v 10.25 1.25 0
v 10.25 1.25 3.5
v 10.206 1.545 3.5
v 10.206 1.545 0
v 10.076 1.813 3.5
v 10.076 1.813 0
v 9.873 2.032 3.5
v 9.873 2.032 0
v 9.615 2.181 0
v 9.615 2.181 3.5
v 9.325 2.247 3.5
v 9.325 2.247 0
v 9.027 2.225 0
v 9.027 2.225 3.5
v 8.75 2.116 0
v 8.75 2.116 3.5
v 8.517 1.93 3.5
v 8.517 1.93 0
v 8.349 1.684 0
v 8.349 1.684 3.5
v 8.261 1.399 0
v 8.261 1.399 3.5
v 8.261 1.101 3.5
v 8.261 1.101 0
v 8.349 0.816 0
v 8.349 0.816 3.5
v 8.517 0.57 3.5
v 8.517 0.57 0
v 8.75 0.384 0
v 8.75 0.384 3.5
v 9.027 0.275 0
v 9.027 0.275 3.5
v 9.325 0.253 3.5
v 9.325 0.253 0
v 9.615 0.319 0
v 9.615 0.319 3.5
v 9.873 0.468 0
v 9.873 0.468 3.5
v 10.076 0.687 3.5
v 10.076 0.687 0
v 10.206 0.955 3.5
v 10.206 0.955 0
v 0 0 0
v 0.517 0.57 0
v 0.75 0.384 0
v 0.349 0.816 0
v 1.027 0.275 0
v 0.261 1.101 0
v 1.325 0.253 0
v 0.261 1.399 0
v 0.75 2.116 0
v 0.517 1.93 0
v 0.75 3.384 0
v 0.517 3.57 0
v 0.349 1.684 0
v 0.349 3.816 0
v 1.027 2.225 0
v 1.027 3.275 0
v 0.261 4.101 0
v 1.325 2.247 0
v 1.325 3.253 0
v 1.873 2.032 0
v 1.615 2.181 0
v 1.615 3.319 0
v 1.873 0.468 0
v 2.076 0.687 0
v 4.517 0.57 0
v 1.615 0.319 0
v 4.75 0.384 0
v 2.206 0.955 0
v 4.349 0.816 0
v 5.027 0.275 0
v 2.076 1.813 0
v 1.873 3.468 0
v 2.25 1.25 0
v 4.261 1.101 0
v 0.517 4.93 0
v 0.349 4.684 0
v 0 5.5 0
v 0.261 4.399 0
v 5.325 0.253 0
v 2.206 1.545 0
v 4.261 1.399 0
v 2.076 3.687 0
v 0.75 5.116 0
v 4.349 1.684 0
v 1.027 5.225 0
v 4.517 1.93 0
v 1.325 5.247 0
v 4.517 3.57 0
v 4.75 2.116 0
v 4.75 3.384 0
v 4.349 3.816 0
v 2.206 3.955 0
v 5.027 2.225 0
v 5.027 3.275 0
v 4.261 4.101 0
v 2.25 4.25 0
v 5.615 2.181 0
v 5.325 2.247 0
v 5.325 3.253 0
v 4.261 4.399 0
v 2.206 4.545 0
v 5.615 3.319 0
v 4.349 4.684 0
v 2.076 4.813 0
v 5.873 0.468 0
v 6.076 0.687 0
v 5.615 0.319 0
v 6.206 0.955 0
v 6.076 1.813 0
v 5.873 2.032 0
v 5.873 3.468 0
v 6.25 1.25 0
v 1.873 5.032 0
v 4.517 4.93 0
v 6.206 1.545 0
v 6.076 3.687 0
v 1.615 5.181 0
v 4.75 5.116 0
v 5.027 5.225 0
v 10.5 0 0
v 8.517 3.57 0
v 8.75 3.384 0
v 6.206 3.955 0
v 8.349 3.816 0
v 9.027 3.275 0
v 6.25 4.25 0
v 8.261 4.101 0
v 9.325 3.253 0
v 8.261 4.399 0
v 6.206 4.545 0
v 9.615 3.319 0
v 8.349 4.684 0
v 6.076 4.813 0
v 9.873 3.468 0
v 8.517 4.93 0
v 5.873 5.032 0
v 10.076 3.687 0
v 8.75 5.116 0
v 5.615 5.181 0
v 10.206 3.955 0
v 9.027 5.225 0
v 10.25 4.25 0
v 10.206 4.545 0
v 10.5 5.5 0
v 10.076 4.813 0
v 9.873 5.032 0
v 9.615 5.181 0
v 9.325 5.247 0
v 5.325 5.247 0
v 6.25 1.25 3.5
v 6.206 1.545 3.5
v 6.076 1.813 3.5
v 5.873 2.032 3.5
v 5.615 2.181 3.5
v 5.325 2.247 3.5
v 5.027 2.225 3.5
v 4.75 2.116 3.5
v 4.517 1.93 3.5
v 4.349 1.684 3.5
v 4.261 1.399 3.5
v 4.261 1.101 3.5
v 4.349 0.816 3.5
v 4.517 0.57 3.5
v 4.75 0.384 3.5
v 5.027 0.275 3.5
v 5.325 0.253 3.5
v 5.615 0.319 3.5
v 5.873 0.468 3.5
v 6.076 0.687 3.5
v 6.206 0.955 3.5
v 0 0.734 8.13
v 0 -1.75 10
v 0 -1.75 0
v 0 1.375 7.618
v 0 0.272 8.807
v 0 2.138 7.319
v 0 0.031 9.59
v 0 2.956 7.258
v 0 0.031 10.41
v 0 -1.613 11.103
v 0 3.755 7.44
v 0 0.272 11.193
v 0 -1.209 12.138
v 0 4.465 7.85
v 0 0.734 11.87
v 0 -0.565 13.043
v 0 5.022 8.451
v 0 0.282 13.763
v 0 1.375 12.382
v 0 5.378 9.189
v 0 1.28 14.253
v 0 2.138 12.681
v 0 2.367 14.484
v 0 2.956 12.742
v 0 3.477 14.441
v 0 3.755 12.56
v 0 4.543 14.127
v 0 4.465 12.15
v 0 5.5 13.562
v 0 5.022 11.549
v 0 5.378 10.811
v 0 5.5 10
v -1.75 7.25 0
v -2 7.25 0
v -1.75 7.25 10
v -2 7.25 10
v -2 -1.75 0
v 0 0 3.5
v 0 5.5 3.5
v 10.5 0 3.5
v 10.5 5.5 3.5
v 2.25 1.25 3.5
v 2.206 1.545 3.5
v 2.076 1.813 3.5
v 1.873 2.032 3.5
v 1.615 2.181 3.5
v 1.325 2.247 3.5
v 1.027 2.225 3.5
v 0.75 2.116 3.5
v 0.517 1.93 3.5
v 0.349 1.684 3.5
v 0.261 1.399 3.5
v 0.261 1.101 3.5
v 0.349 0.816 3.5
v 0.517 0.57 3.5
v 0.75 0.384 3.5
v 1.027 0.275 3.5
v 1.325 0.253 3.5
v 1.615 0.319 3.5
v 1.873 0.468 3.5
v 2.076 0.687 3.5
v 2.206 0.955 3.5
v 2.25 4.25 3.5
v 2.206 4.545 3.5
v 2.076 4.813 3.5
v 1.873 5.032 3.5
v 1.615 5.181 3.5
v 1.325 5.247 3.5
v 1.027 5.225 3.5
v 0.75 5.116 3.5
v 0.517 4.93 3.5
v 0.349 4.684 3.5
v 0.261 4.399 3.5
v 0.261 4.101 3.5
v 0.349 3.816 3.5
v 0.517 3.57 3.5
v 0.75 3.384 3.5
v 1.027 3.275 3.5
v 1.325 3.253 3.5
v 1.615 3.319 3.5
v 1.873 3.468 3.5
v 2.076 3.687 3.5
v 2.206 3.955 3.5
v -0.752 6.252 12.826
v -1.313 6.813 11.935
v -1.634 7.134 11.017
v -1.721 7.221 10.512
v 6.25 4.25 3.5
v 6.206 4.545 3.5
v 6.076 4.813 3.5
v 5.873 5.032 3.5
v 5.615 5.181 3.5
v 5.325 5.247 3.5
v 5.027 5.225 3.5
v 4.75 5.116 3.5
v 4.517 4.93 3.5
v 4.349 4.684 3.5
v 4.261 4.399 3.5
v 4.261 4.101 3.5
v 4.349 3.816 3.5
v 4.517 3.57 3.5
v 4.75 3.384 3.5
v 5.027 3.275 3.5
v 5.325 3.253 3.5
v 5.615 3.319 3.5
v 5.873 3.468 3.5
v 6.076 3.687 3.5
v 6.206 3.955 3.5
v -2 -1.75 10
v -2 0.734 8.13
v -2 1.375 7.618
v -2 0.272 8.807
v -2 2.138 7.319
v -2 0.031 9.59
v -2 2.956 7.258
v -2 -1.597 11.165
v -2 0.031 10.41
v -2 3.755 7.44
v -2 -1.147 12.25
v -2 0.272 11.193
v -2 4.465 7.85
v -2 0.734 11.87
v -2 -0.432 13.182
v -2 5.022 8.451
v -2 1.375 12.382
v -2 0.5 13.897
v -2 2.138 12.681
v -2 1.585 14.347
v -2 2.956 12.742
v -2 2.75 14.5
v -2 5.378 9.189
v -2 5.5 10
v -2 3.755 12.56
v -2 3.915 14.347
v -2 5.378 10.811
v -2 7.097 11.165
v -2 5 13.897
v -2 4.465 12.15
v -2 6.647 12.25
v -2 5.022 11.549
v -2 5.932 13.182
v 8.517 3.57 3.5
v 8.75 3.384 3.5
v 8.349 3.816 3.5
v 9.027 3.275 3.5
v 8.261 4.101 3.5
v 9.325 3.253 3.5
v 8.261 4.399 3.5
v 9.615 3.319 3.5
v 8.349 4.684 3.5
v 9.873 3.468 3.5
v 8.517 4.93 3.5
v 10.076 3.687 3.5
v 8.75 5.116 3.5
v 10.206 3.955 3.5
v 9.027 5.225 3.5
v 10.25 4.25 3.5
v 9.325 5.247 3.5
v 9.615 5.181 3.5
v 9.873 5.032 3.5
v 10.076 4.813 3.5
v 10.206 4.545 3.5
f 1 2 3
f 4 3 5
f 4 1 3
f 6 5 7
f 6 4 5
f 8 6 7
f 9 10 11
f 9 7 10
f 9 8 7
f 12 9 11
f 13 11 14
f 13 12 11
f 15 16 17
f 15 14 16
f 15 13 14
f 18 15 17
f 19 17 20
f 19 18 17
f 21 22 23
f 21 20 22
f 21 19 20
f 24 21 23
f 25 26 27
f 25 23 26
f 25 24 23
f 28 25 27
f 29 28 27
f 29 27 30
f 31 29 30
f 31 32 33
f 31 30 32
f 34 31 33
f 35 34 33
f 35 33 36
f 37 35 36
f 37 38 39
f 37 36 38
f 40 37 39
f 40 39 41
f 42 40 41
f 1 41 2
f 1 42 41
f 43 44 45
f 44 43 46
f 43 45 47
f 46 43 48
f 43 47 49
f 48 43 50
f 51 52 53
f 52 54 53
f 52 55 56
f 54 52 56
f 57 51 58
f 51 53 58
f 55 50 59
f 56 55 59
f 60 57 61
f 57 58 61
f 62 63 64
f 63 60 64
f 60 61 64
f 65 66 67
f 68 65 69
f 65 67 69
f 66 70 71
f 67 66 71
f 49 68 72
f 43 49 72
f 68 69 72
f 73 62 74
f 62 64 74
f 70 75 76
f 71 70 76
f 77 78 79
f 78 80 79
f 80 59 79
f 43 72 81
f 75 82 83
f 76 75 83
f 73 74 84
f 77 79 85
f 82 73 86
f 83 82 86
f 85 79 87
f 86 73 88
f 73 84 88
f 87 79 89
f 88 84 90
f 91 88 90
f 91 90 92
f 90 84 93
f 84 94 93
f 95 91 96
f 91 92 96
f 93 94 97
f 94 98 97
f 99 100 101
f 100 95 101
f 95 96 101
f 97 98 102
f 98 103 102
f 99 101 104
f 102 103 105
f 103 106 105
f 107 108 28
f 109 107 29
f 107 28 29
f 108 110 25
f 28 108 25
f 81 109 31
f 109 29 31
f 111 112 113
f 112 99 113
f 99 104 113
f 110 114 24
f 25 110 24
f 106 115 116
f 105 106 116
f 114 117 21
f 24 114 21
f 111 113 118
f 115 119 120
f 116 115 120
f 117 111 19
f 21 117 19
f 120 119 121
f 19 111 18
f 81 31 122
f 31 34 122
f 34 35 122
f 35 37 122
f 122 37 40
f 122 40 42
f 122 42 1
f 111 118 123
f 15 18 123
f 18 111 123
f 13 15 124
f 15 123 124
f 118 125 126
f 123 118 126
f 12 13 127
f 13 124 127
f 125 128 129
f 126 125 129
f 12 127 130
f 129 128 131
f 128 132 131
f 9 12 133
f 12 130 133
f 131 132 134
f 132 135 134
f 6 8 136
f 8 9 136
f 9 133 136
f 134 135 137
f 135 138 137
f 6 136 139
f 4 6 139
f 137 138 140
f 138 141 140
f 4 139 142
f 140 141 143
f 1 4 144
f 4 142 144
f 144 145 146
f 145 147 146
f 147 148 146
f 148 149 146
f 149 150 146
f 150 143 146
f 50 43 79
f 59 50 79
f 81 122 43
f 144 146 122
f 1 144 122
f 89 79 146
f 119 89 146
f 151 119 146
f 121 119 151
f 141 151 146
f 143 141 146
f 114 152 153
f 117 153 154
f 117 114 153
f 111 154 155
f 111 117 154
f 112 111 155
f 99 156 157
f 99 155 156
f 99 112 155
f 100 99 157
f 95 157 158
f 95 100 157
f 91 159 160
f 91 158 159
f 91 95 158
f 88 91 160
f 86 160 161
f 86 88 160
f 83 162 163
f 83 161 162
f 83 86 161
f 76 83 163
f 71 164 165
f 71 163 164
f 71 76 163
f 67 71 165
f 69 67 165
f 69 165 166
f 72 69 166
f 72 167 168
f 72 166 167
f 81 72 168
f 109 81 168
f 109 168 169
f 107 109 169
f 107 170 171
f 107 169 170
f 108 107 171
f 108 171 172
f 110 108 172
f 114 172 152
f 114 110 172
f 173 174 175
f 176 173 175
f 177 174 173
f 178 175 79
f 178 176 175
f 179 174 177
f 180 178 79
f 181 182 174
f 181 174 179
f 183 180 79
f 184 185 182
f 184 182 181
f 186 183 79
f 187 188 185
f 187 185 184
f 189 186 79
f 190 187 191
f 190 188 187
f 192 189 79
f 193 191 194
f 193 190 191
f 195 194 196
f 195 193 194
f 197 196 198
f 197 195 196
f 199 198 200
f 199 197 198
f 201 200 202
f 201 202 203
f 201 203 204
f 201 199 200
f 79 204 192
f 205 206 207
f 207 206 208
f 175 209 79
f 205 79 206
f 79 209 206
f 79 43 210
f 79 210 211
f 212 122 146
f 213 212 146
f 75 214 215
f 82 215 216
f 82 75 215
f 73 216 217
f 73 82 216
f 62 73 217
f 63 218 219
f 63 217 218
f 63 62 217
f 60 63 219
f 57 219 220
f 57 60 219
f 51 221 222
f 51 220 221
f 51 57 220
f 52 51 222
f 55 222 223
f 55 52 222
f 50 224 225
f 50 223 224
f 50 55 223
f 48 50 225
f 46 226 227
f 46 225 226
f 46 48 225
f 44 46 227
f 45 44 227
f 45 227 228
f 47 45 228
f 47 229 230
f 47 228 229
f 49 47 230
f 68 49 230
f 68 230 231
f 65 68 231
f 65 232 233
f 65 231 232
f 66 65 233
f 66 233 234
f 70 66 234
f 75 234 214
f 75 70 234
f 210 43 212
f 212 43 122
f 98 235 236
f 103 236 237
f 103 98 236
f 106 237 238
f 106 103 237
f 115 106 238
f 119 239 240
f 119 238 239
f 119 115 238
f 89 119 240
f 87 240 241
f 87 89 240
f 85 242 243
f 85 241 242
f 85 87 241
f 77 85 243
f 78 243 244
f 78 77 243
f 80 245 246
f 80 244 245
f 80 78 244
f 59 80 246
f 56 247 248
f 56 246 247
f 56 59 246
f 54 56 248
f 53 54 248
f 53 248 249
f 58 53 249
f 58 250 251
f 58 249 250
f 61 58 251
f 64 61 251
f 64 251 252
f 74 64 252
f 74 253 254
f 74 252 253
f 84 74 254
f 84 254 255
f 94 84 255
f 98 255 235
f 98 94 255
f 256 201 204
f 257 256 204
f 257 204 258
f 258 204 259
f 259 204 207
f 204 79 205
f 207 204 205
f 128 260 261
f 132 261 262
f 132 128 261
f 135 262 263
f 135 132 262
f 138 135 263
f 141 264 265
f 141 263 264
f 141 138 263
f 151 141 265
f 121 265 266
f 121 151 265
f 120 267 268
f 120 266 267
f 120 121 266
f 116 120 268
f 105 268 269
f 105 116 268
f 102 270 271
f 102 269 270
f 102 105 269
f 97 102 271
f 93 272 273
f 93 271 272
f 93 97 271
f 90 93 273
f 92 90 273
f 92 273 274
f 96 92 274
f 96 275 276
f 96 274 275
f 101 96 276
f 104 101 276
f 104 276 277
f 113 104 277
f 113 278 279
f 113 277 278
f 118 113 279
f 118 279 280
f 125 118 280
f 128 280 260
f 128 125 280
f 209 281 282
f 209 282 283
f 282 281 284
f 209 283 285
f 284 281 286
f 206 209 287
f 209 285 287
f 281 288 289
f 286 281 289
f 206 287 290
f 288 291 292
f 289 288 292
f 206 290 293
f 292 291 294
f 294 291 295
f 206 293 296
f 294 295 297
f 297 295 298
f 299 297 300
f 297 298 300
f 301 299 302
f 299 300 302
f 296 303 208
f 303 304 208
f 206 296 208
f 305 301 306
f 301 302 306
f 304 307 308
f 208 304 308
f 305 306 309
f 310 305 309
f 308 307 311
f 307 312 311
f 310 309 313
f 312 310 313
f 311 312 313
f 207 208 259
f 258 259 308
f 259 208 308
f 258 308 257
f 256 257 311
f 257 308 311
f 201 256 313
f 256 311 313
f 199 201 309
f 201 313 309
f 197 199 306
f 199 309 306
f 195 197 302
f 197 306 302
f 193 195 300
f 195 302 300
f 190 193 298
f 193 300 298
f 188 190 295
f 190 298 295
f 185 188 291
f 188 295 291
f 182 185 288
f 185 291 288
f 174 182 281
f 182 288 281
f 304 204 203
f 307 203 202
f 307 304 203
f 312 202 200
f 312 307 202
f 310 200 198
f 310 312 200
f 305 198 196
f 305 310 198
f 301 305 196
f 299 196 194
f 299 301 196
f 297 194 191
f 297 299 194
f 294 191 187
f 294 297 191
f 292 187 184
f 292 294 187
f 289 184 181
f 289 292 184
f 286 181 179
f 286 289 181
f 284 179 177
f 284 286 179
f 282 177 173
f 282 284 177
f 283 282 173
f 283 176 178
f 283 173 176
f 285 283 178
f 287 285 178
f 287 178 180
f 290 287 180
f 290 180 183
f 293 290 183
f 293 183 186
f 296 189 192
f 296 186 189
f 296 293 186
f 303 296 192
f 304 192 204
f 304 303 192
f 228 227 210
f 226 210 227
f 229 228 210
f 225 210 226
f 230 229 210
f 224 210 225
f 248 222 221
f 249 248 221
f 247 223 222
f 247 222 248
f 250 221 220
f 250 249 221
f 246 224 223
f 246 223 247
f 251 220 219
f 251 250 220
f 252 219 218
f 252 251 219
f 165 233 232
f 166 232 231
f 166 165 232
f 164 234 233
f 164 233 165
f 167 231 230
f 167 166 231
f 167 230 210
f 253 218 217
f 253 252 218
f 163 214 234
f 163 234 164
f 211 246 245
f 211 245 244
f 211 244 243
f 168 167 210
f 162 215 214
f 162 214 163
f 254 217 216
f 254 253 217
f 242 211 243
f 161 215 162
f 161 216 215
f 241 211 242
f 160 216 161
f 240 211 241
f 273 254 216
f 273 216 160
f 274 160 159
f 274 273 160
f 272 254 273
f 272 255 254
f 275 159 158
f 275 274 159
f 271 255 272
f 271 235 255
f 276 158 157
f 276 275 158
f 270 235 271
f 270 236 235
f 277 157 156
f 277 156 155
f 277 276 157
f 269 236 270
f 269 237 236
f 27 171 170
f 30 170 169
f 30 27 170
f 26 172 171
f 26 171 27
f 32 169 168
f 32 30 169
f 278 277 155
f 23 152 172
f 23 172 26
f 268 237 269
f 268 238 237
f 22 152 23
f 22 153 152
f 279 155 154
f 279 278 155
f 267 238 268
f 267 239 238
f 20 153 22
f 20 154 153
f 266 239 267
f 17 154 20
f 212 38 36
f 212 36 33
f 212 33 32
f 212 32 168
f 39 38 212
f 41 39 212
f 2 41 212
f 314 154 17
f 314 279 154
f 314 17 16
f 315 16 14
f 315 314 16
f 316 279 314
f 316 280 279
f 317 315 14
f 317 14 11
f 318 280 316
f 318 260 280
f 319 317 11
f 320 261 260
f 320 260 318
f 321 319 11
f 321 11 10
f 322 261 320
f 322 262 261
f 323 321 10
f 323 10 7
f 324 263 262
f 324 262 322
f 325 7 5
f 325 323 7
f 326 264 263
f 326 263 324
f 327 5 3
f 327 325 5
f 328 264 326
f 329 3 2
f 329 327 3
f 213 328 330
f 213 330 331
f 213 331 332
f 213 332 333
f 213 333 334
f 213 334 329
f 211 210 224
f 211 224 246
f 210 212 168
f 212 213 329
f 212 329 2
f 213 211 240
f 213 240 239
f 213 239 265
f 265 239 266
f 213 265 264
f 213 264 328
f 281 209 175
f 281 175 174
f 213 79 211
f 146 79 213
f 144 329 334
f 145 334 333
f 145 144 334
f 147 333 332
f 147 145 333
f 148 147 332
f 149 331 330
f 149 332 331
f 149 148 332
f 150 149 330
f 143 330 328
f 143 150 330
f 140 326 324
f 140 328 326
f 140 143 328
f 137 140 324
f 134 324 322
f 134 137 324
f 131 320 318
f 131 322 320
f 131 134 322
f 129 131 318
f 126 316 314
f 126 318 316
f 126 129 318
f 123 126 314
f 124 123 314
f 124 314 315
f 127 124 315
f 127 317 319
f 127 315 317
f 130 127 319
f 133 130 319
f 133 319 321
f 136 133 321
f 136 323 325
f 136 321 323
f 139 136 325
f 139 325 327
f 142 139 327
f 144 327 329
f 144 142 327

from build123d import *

# Parameters (mm, degrees)
SKETCH003_R      = 1
EXTRUDE002_DEPTH = 4
SKETCH002_R      = 1
EXTRUDE003_DEPTH = 4
SKETCH001_R      = 1
EXTRUDE001_DEPTH = 4
SKETCH_W         = 10.5
SKETCH_H         = 5.5
EXTRUDE_DEPTH    = 3.5
SKETCH006_R      = 2.75
EXTRUDE006_DEPTH = 5
EXTRUDE005_DEPTH = 15
EXTRUDE004_DEPTH = 2


with BuildPart() as extrude002:
    # Sketch003 → Extrude002 (new body)
    with BuildSketch(Plane(origin=(8.25, 0.25, 0), x_dir=(1, 0, 0), z_dir=(0, 0, 1))):
        with Locations((1, 1)):
            Circle(SKETCH003_R)
        with Locations((1, 4)):
            Circle(SKETCH003_R)
    extrude(amount=EXTRUDE002_DEPTH)


with BuildPart() as extrude003:
    # Sketch002 → Extrude003 (new body)
    with BuildSketch(Plane(origin=(4.25, 0.25, 0), x_dir=(1, 0, 0), z_dir=(0, 0, 1))):
        with Locations((1, 1)):
            Circle(SKETCH002_R)
        with Locations((1, 4)):
            Circle(SKETCH002_R)
    extrude(amount=EXTRUDE003_DEPTH)


with BuildPart() as fusion:
    # Sketch001 → Extrude001 (new body)
    with BuildSketch(Plane(origin=(0.25, 0.25, 0), x_dir=(1, 0, 0), z_dir=(0, 0, 1))):
        with Locations((1, 1)):
            Circle(SKETCH001_R)
        with Locations((1, 4)):
            Circle(SKETCH001_R)
    extrude(amount=EXTRUDE001_DEPTH)

    # Fusion: union Extrude002, Extrude003
    add(extrude002.part)
    add(extrude003.part)


with BuildPart() as cut:
    # Sketch → Extrude (new body)
    with BuildSketch(Plane.XY):
        with Locations((5.25, 2.75)):
            Rectangle(SKETCH_W, SKETCH_H)
    extrude(amount=EXTRUDE_DEPTH)

    # Cut: cut Fusion
    add(fusion.part, mode=Mode.SUBTRACT)


with BuildPart() as extrude006:
    # Sketch006 → Extrude006 (new body)
    with BuildSketch(Plane.YZ.offset(-2)):
        with Locations((2.75, 10)):
            Circle(SKETCH006_R)
    extrude(amount=EXTRUDE006_DEPTH)


with BuildPart() as extrude005:
    # Sketch005 → Extrude005 (new body)
    with BuildSketch(Plane.XY):
        Polygon((0, 5.5), (-1.75, 7.25), (0, 7.25), align=None)
    extrude(amount=EXTRUDE005_DEPTH)


with BuildPart() as cut002:
    # Sketch004 → Extrude004 (new body)
    with BuildSketch(Plane.YZ.offset(-2)):
        with BuildLine():
            Line((-1.75, 0), (7.25, 0))
            Line((7.25, 0), (7.25, 10))
            ThreePointArc((7.25, 10), (2.749999, 14.5), (-1.75, 9.999998))
            Line((-1.75, 0), (-1.75, 9.999998))
        make_face()
    extrude(amount=EXTRUDE004_DEPTH)

    # Cut001: cut Extrude005
    add(extrude005.part, mode=Mode.SUBTRACT)

    # Cut002: cut Extrude006
    add(extrude006.part, mode=Mode.SUBTRACT)


solid = Compound([cut.part, cut002.part])
